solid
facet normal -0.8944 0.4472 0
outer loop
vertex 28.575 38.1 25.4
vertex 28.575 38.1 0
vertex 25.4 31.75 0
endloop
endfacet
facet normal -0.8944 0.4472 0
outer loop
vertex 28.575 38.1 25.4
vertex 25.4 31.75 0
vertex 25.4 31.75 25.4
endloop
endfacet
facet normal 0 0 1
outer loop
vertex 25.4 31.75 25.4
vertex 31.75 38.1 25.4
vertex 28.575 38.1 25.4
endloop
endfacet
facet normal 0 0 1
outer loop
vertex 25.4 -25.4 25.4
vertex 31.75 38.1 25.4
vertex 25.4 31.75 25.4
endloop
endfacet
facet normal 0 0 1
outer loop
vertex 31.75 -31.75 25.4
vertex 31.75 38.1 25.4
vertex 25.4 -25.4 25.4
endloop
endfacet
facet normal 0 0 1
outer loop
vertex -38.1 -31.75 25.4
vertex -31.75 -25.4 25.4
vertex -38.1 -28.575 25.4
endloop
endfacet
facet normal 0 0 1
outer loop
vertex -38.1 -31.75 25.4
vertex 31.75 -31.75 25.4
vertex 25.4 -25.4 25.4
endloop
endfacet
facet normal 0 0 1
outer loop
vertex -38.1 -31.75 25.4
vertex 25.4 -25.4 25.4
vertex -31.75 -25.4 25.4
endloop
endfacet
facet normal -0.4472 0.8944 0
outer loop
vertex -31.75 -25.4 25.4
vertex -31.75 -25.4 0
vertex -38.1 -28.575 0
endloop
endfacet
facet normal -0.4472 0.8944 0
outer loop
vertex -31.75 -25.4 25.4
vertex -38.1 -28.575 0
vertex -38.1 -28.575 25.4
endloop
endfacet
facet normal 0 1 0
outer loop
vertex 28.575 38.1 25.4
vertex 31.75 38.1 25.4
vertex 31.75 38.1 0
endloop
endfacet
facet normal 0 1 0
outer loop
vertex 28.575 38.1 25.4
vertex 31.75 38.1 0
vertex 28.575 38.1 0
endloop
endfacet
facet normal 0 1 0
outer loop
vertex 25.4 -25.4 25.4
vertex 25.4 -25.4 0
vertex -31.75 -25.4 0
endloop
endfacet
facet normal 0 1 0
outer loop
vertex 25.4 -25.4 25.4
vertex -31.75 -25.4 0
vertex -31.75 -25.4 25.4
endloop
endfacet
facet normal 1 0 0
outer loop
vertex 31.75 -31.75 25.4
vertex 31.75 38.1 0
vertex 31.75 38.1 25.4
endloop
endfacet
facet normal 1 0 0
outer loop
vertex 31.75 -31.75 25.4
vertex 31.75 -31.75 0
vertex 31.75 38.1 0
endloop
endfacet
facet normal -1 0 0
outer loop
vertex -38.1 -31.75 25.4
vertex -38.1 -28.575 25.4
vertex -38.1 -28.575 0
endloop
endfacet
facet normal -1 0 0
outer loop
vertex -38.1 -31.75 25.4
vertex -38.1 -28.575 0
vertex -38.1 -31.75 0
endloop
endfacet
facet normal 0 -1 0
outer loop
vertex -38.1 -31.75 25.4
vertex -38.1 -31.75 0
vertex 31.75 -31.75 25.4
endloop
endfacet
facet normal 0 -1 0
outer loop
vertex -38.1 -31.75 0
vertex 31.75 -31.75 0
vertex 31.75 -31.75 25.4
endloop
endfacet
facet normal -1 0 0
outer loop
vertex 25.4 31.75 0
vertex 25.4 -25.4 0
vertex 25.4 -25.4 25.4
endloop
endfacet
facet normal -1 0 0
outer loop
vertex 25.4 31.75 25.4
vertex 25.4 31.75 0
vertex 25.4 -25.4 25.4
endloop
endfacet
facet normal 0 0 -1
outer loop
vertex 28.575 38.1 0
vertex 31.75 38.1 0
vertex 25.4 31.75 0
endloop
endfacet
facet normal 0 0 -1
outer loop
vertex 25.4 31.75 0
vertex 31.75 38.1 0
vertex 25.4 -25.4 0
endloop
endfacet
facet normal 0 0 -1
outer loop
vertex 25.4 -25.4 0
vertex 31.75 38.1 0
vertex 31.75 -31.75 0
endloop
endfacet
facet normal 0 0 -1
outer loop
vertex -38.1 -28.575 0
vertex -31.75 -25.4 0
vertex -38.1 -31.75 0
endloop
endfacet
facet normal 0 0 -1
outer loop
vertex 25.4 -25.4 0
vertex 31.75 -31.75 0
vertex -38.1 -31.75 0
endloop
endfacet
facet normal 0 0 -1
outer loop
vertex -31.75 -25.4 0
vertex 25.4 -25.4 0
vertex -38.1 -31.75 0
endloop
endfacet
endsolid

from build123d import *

# Parameters (mm, degrees)
F1_DEPTH = 25.4
F2_DEPTH = 6.35
F3_DEPTH = 6.35
F4_SIZE2 = 6.35
F4_SIZE  = 3.175
F5_SIZE2 = 3.175
F5_SIZE  = 6.35


with BuildPart() as f1:
    # F0 (on Top) → F1 (new body)
    with BuildSketch(Plane.XY):
        Polygon((25.4, 25.4), (25.4, -25.4), (-25.4, -25.4), (-31.75, -25.4), (-31.75, -31.75), (31.75, -31.75), (31.75, 31.75), (25.4, 31.75), align=None)
    extrude(amount=F1_DEPTH)

    # F2 (add): a face of the model
    f2_faces = [f1.faces().sort_by_distance(p)[0] for p in [
        (-31.75, -28.575, 12.7),
    ]]
    extrude(f2_faces, amount=F2_DEPTH)

    # F3 (add): a face of the model
    f3_faces = [f1.faces().sort_by_distance(p)[0] for p in [
        (28.575, 31.75, 12.7),
    ]]
    extrude(f3_faces, amount=F3_DEPTH)

    # F4
    f4_edges = [f1.edges().sort_by_distance(p)[0] for p in [
        (-38.1, -25.4, 12.7),
    ]]
    chamfer(f4_edges, length=F4_SIZE, length2=F4_SIZE2)

    # F5
    f5_edges = [f1.edges().sort_by_distance(p)[0] for p in [
        (25.4, 38.1, 12.7),
    ]]
    chamfer(f5_edges, length=F5_SIZE, length2=F5_SIZE2)


solid = f1.part
